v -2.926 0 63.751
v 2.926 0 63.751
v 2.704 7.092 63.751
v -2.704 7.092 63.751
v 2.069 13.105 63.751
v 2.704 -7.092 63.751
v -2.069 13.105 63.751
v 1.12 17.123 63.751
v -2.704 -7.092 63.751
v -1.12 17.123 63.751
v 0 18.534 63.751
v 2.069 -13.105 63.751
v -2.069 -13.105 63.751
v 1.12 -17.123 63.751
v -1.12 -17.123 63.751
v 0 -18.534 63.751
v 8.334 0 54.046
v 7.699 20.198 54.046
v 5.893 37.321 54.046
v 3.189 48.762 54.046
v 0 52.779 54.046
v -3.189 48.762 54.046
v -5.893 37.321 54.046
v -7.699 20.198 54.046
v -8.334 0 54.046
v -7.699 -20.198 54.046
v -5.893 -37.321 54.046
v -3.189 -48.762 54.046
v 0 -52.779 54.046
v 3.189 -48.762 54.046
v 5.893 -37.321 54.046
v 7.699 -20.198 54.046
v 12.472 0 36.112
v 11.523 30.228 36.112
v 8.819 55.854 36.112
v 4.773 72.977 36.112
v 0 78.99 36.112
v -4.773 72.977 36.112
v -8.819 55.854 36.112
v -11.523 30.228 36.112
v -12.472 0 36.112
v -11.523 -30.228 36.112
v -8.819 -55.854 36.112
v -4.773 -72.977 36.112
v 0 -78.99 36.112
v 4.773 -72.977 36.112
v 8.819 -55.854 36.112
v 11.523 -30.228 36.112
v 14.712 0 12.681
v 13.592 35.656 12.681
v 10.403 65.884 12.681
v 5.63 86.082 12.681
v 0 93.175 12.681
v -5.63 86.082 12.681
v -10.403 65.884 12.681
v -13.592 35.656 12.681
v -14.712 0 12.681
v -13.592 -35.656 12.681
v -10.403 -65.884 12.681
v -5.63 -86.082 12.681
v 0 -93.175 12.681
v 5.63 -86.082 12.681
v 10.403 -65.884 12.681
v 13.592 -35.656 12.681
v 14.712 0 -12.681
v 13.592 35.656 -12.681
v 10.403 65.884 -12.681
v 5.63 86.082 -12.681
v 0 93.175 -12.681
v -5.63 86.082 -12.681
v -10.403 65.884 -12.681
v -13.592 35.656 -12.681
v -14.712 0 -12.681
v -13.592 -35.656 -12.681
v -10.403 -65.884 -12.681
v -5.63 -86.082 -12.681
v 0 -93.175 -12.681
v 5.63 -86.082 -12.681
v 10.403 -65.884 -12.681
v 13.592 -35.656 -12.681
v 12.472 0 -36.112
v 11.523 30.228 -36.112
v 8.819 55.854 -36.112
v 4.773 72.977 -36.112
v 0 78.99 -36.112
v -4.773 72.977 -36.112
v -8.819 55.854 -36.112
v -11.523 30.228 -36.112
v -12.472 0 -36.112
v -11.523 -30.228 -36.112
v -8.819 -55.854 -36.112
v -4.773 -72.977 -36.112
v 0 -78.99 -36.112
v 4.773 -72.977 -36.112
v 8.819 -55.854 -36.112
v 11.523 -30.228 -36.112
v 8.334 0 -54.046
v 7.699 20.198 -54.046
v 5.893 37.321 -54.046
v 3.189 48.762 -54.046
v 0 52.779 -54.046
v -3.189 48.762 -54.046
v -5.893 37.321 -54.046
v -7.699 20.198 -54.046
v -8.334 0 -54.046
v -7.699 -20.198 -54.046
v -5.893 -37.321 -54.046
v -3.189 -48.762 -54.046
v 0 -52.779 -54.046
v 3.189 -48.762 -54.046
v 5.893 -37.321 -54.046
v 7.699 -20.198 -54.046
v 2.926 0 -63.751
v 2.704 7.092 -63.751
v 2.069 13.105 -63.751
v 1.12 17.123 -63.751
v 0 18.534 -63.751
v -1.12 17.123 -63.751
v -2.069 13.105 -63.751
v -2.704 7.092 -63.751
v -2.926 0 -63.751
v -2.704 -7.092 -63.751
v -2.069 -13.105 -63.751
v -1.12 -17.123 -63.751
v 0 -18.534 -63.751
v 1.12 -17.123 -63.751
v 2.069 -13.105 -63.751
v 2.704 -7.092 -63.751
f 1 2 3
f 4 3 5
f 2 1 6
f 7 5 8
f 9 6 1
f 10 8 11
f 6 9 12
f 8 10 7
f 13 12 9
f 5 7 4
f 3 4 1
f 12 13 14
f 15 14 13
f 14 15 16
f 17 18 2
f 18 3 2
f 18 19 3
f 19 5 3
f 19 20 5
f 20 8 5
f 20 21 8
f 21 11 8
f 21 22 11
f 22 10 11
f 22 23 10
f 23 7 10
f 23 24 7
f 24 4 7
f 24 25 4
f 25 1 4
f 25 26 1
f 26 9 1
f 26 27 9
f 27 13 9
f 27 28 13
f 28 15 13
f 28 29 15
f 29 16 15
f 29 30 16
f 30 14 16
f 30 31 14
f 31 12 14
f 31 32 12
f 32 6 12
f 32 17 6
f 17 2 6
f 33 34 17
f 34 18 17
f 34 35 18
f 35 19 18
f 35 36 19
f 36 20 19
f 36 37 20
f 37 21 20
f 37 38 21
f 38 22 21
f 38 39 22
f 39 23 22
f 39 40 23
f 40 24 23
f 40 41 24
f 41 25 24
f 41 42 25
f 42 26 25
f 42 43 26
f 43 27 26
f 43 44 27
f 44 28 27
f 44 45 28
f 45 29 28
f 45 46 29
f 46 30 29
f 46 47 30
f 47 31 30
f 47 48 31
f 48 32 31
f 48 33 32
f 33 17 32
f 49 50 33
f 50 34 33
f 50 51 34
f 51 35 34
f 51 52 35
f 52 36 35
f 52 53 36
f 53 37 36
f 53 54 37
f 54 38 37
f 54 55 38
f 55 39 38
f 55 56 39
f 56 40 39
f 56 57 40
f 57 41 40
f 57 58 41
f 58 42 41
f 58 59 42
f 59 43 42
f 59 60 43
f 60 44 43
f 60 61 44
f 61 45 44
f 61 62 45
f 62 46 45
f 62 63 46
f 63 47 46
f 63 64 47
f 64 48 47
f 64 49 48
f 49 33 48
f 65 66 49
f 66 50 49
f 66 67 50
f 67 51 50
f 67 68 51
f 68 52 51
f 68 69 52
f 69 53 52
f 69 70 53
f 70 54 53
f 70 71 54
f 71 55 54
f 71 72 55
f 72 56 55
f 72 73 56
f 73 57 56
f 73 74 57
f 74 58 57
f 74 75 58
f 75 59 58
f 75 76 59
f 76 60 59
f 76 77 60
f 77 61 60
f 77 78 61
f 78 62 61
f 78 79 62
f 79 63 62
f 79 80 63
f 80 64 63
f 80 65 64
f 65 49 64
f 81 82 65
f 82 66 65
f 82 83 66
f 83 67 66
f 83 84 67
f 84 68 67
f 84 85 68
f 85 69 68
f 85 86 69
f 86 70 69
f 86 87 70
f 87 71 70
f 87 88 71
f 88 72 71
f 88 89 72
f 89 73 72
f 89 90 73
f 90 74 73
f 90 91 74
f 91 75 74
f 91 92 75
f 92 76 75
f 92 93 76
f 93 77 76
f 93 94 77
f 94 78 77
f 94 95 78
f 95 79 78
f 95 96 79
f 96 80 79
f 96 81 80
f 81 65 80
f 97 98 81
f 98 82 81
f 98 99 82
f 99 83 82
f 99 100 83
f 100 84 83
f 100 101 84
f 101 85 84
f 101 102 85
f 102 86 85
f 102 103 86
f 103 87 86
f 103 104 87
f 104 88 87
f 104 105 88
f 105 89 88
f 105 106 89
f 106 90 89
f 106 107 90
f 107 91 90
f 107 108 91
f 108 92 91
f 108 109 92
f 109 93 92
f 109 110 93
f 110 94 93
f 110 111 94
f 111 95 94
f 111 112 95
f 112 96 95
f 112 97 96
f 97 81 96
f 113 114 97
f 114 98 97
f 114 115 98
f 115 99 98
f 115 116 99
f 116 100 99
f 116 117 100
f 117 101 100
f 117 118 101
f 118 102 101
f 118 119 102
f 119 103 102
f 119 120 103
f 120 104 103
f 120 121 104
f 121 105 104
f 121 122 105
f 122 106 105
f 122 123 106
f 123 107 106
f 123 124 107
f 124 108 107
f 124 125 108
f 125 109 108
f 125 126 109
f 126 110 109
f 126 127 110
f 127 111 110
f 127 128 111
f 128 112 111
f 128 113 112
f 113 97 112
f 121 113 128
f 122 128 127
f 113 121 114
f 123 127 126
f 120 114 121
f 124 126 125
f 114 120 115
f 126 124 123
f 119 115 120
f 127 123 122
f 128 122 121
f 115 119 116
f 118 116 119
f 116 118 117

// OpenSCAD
// Generated by SolidPython 1.0.1 on 2020-07-29 00:46:46


scale(v = [3, 19, 13]) {
	sphere(r = 5);
}
/***********************************************
*********      SolidPython code:      **********
************************************************
 
# import packages: SolidPython
from solid import *
from solid.utils import *
from itertools import chain, combinations, permutations


class Resize:

    def __init__(self, scad_file):
        self.scad_file = scad_file
        #self.scad_file = import_scad(scad_file)
        # cone/cylinder param:
        self.r1 = 0
        self.r2 = 0
        self.h = 0
        # rectangular prism param:
        self.w = 0
        self.l = 0
        # ellipse param:
        self.r = 0

    # import OpenScad code (file name corresponds to shape)


    # classify shape + parameters
    def assign(self, param1, param2, param3):
        if self.scad_file == 'cone.scad':
            self.r1 = param1
            self.r2 = param2
            self.h = param3
        elif self.scad_file == 'cylinder.scad':
            self.r1 = param1
            self.r2 = param2
            self.h = param3
        elif self.scad_file == 'rectangularPrism.scad':
            self.h = param1
            self.l = param2
            self.w = param3
        else:
            self.r = param1
            self.h = param2

    # resize parameters
    def iterate(self):
        x = range(3, 20, 2)
        i = 1
        if self.scad_file == 'cone.scad':
            tempList = list(permutations(x, 2))
            for temp in tempList:
                param1 = temp[0]
                param2 = temp[1]
                filepath = 'produced_scad_files/' + 'cone' + str(param1) + '_' + str(param2) + '_' + '.scad'
                scad_render_to_file(cylinder(h=param1, r1=param2, r2=0), filepath)

        elif self.scad_file == 'cylinder.scad':
            tempList = list(permutations(x, 3))
            for temp in tempList:
                param1 = temp[0]
                param2 = temp[1]
                filepath = 'produced_scad_files/' + 'cylinder' + str(param1) + '_' + str(param2) + '_' + '.scad'
                scad_render_to_file(cylinder(h=param1, r1=param2, r2=param2), filepath)

        elif self.scad_file == 'rectangularPrism.scad':
            tempList = list(permutations(x, 3))
            for temp in tempList:
                param1 = temp[0]
                param2 = temp[1]
                param3 = temp[2]
                filepath = 'produced_scad_files/' + 'rectangularPrism' + str(param1) + '_' + str(param2) + '_' + str(
                    param3) + '.scad'
                scad_render_to_file(cube(size=(param1, param2, param3)), filepath)

        elif self.scad_file == 'ellipse.scad':
            tempList = list(permutations(x, 4))
            for temp in tempList:
                param1 = temp[0]
                param2 = temp[1]
                param3 = temp[2]
                param4 = temp[3]
                filepath = 'produced_scad_files/' + 'ellipse' + str(param1) + '_' + str(param2) + '_' + str(param3) + '_' + str(param4) + '.scad'
                scad_render_to_file(scale([param1, param2, param3])(sphere(r=param4)), filepath)

    def render_to_scadfile(self):
        scad_render_to_file(scad, 'example.scad') 
 
************************************************/
